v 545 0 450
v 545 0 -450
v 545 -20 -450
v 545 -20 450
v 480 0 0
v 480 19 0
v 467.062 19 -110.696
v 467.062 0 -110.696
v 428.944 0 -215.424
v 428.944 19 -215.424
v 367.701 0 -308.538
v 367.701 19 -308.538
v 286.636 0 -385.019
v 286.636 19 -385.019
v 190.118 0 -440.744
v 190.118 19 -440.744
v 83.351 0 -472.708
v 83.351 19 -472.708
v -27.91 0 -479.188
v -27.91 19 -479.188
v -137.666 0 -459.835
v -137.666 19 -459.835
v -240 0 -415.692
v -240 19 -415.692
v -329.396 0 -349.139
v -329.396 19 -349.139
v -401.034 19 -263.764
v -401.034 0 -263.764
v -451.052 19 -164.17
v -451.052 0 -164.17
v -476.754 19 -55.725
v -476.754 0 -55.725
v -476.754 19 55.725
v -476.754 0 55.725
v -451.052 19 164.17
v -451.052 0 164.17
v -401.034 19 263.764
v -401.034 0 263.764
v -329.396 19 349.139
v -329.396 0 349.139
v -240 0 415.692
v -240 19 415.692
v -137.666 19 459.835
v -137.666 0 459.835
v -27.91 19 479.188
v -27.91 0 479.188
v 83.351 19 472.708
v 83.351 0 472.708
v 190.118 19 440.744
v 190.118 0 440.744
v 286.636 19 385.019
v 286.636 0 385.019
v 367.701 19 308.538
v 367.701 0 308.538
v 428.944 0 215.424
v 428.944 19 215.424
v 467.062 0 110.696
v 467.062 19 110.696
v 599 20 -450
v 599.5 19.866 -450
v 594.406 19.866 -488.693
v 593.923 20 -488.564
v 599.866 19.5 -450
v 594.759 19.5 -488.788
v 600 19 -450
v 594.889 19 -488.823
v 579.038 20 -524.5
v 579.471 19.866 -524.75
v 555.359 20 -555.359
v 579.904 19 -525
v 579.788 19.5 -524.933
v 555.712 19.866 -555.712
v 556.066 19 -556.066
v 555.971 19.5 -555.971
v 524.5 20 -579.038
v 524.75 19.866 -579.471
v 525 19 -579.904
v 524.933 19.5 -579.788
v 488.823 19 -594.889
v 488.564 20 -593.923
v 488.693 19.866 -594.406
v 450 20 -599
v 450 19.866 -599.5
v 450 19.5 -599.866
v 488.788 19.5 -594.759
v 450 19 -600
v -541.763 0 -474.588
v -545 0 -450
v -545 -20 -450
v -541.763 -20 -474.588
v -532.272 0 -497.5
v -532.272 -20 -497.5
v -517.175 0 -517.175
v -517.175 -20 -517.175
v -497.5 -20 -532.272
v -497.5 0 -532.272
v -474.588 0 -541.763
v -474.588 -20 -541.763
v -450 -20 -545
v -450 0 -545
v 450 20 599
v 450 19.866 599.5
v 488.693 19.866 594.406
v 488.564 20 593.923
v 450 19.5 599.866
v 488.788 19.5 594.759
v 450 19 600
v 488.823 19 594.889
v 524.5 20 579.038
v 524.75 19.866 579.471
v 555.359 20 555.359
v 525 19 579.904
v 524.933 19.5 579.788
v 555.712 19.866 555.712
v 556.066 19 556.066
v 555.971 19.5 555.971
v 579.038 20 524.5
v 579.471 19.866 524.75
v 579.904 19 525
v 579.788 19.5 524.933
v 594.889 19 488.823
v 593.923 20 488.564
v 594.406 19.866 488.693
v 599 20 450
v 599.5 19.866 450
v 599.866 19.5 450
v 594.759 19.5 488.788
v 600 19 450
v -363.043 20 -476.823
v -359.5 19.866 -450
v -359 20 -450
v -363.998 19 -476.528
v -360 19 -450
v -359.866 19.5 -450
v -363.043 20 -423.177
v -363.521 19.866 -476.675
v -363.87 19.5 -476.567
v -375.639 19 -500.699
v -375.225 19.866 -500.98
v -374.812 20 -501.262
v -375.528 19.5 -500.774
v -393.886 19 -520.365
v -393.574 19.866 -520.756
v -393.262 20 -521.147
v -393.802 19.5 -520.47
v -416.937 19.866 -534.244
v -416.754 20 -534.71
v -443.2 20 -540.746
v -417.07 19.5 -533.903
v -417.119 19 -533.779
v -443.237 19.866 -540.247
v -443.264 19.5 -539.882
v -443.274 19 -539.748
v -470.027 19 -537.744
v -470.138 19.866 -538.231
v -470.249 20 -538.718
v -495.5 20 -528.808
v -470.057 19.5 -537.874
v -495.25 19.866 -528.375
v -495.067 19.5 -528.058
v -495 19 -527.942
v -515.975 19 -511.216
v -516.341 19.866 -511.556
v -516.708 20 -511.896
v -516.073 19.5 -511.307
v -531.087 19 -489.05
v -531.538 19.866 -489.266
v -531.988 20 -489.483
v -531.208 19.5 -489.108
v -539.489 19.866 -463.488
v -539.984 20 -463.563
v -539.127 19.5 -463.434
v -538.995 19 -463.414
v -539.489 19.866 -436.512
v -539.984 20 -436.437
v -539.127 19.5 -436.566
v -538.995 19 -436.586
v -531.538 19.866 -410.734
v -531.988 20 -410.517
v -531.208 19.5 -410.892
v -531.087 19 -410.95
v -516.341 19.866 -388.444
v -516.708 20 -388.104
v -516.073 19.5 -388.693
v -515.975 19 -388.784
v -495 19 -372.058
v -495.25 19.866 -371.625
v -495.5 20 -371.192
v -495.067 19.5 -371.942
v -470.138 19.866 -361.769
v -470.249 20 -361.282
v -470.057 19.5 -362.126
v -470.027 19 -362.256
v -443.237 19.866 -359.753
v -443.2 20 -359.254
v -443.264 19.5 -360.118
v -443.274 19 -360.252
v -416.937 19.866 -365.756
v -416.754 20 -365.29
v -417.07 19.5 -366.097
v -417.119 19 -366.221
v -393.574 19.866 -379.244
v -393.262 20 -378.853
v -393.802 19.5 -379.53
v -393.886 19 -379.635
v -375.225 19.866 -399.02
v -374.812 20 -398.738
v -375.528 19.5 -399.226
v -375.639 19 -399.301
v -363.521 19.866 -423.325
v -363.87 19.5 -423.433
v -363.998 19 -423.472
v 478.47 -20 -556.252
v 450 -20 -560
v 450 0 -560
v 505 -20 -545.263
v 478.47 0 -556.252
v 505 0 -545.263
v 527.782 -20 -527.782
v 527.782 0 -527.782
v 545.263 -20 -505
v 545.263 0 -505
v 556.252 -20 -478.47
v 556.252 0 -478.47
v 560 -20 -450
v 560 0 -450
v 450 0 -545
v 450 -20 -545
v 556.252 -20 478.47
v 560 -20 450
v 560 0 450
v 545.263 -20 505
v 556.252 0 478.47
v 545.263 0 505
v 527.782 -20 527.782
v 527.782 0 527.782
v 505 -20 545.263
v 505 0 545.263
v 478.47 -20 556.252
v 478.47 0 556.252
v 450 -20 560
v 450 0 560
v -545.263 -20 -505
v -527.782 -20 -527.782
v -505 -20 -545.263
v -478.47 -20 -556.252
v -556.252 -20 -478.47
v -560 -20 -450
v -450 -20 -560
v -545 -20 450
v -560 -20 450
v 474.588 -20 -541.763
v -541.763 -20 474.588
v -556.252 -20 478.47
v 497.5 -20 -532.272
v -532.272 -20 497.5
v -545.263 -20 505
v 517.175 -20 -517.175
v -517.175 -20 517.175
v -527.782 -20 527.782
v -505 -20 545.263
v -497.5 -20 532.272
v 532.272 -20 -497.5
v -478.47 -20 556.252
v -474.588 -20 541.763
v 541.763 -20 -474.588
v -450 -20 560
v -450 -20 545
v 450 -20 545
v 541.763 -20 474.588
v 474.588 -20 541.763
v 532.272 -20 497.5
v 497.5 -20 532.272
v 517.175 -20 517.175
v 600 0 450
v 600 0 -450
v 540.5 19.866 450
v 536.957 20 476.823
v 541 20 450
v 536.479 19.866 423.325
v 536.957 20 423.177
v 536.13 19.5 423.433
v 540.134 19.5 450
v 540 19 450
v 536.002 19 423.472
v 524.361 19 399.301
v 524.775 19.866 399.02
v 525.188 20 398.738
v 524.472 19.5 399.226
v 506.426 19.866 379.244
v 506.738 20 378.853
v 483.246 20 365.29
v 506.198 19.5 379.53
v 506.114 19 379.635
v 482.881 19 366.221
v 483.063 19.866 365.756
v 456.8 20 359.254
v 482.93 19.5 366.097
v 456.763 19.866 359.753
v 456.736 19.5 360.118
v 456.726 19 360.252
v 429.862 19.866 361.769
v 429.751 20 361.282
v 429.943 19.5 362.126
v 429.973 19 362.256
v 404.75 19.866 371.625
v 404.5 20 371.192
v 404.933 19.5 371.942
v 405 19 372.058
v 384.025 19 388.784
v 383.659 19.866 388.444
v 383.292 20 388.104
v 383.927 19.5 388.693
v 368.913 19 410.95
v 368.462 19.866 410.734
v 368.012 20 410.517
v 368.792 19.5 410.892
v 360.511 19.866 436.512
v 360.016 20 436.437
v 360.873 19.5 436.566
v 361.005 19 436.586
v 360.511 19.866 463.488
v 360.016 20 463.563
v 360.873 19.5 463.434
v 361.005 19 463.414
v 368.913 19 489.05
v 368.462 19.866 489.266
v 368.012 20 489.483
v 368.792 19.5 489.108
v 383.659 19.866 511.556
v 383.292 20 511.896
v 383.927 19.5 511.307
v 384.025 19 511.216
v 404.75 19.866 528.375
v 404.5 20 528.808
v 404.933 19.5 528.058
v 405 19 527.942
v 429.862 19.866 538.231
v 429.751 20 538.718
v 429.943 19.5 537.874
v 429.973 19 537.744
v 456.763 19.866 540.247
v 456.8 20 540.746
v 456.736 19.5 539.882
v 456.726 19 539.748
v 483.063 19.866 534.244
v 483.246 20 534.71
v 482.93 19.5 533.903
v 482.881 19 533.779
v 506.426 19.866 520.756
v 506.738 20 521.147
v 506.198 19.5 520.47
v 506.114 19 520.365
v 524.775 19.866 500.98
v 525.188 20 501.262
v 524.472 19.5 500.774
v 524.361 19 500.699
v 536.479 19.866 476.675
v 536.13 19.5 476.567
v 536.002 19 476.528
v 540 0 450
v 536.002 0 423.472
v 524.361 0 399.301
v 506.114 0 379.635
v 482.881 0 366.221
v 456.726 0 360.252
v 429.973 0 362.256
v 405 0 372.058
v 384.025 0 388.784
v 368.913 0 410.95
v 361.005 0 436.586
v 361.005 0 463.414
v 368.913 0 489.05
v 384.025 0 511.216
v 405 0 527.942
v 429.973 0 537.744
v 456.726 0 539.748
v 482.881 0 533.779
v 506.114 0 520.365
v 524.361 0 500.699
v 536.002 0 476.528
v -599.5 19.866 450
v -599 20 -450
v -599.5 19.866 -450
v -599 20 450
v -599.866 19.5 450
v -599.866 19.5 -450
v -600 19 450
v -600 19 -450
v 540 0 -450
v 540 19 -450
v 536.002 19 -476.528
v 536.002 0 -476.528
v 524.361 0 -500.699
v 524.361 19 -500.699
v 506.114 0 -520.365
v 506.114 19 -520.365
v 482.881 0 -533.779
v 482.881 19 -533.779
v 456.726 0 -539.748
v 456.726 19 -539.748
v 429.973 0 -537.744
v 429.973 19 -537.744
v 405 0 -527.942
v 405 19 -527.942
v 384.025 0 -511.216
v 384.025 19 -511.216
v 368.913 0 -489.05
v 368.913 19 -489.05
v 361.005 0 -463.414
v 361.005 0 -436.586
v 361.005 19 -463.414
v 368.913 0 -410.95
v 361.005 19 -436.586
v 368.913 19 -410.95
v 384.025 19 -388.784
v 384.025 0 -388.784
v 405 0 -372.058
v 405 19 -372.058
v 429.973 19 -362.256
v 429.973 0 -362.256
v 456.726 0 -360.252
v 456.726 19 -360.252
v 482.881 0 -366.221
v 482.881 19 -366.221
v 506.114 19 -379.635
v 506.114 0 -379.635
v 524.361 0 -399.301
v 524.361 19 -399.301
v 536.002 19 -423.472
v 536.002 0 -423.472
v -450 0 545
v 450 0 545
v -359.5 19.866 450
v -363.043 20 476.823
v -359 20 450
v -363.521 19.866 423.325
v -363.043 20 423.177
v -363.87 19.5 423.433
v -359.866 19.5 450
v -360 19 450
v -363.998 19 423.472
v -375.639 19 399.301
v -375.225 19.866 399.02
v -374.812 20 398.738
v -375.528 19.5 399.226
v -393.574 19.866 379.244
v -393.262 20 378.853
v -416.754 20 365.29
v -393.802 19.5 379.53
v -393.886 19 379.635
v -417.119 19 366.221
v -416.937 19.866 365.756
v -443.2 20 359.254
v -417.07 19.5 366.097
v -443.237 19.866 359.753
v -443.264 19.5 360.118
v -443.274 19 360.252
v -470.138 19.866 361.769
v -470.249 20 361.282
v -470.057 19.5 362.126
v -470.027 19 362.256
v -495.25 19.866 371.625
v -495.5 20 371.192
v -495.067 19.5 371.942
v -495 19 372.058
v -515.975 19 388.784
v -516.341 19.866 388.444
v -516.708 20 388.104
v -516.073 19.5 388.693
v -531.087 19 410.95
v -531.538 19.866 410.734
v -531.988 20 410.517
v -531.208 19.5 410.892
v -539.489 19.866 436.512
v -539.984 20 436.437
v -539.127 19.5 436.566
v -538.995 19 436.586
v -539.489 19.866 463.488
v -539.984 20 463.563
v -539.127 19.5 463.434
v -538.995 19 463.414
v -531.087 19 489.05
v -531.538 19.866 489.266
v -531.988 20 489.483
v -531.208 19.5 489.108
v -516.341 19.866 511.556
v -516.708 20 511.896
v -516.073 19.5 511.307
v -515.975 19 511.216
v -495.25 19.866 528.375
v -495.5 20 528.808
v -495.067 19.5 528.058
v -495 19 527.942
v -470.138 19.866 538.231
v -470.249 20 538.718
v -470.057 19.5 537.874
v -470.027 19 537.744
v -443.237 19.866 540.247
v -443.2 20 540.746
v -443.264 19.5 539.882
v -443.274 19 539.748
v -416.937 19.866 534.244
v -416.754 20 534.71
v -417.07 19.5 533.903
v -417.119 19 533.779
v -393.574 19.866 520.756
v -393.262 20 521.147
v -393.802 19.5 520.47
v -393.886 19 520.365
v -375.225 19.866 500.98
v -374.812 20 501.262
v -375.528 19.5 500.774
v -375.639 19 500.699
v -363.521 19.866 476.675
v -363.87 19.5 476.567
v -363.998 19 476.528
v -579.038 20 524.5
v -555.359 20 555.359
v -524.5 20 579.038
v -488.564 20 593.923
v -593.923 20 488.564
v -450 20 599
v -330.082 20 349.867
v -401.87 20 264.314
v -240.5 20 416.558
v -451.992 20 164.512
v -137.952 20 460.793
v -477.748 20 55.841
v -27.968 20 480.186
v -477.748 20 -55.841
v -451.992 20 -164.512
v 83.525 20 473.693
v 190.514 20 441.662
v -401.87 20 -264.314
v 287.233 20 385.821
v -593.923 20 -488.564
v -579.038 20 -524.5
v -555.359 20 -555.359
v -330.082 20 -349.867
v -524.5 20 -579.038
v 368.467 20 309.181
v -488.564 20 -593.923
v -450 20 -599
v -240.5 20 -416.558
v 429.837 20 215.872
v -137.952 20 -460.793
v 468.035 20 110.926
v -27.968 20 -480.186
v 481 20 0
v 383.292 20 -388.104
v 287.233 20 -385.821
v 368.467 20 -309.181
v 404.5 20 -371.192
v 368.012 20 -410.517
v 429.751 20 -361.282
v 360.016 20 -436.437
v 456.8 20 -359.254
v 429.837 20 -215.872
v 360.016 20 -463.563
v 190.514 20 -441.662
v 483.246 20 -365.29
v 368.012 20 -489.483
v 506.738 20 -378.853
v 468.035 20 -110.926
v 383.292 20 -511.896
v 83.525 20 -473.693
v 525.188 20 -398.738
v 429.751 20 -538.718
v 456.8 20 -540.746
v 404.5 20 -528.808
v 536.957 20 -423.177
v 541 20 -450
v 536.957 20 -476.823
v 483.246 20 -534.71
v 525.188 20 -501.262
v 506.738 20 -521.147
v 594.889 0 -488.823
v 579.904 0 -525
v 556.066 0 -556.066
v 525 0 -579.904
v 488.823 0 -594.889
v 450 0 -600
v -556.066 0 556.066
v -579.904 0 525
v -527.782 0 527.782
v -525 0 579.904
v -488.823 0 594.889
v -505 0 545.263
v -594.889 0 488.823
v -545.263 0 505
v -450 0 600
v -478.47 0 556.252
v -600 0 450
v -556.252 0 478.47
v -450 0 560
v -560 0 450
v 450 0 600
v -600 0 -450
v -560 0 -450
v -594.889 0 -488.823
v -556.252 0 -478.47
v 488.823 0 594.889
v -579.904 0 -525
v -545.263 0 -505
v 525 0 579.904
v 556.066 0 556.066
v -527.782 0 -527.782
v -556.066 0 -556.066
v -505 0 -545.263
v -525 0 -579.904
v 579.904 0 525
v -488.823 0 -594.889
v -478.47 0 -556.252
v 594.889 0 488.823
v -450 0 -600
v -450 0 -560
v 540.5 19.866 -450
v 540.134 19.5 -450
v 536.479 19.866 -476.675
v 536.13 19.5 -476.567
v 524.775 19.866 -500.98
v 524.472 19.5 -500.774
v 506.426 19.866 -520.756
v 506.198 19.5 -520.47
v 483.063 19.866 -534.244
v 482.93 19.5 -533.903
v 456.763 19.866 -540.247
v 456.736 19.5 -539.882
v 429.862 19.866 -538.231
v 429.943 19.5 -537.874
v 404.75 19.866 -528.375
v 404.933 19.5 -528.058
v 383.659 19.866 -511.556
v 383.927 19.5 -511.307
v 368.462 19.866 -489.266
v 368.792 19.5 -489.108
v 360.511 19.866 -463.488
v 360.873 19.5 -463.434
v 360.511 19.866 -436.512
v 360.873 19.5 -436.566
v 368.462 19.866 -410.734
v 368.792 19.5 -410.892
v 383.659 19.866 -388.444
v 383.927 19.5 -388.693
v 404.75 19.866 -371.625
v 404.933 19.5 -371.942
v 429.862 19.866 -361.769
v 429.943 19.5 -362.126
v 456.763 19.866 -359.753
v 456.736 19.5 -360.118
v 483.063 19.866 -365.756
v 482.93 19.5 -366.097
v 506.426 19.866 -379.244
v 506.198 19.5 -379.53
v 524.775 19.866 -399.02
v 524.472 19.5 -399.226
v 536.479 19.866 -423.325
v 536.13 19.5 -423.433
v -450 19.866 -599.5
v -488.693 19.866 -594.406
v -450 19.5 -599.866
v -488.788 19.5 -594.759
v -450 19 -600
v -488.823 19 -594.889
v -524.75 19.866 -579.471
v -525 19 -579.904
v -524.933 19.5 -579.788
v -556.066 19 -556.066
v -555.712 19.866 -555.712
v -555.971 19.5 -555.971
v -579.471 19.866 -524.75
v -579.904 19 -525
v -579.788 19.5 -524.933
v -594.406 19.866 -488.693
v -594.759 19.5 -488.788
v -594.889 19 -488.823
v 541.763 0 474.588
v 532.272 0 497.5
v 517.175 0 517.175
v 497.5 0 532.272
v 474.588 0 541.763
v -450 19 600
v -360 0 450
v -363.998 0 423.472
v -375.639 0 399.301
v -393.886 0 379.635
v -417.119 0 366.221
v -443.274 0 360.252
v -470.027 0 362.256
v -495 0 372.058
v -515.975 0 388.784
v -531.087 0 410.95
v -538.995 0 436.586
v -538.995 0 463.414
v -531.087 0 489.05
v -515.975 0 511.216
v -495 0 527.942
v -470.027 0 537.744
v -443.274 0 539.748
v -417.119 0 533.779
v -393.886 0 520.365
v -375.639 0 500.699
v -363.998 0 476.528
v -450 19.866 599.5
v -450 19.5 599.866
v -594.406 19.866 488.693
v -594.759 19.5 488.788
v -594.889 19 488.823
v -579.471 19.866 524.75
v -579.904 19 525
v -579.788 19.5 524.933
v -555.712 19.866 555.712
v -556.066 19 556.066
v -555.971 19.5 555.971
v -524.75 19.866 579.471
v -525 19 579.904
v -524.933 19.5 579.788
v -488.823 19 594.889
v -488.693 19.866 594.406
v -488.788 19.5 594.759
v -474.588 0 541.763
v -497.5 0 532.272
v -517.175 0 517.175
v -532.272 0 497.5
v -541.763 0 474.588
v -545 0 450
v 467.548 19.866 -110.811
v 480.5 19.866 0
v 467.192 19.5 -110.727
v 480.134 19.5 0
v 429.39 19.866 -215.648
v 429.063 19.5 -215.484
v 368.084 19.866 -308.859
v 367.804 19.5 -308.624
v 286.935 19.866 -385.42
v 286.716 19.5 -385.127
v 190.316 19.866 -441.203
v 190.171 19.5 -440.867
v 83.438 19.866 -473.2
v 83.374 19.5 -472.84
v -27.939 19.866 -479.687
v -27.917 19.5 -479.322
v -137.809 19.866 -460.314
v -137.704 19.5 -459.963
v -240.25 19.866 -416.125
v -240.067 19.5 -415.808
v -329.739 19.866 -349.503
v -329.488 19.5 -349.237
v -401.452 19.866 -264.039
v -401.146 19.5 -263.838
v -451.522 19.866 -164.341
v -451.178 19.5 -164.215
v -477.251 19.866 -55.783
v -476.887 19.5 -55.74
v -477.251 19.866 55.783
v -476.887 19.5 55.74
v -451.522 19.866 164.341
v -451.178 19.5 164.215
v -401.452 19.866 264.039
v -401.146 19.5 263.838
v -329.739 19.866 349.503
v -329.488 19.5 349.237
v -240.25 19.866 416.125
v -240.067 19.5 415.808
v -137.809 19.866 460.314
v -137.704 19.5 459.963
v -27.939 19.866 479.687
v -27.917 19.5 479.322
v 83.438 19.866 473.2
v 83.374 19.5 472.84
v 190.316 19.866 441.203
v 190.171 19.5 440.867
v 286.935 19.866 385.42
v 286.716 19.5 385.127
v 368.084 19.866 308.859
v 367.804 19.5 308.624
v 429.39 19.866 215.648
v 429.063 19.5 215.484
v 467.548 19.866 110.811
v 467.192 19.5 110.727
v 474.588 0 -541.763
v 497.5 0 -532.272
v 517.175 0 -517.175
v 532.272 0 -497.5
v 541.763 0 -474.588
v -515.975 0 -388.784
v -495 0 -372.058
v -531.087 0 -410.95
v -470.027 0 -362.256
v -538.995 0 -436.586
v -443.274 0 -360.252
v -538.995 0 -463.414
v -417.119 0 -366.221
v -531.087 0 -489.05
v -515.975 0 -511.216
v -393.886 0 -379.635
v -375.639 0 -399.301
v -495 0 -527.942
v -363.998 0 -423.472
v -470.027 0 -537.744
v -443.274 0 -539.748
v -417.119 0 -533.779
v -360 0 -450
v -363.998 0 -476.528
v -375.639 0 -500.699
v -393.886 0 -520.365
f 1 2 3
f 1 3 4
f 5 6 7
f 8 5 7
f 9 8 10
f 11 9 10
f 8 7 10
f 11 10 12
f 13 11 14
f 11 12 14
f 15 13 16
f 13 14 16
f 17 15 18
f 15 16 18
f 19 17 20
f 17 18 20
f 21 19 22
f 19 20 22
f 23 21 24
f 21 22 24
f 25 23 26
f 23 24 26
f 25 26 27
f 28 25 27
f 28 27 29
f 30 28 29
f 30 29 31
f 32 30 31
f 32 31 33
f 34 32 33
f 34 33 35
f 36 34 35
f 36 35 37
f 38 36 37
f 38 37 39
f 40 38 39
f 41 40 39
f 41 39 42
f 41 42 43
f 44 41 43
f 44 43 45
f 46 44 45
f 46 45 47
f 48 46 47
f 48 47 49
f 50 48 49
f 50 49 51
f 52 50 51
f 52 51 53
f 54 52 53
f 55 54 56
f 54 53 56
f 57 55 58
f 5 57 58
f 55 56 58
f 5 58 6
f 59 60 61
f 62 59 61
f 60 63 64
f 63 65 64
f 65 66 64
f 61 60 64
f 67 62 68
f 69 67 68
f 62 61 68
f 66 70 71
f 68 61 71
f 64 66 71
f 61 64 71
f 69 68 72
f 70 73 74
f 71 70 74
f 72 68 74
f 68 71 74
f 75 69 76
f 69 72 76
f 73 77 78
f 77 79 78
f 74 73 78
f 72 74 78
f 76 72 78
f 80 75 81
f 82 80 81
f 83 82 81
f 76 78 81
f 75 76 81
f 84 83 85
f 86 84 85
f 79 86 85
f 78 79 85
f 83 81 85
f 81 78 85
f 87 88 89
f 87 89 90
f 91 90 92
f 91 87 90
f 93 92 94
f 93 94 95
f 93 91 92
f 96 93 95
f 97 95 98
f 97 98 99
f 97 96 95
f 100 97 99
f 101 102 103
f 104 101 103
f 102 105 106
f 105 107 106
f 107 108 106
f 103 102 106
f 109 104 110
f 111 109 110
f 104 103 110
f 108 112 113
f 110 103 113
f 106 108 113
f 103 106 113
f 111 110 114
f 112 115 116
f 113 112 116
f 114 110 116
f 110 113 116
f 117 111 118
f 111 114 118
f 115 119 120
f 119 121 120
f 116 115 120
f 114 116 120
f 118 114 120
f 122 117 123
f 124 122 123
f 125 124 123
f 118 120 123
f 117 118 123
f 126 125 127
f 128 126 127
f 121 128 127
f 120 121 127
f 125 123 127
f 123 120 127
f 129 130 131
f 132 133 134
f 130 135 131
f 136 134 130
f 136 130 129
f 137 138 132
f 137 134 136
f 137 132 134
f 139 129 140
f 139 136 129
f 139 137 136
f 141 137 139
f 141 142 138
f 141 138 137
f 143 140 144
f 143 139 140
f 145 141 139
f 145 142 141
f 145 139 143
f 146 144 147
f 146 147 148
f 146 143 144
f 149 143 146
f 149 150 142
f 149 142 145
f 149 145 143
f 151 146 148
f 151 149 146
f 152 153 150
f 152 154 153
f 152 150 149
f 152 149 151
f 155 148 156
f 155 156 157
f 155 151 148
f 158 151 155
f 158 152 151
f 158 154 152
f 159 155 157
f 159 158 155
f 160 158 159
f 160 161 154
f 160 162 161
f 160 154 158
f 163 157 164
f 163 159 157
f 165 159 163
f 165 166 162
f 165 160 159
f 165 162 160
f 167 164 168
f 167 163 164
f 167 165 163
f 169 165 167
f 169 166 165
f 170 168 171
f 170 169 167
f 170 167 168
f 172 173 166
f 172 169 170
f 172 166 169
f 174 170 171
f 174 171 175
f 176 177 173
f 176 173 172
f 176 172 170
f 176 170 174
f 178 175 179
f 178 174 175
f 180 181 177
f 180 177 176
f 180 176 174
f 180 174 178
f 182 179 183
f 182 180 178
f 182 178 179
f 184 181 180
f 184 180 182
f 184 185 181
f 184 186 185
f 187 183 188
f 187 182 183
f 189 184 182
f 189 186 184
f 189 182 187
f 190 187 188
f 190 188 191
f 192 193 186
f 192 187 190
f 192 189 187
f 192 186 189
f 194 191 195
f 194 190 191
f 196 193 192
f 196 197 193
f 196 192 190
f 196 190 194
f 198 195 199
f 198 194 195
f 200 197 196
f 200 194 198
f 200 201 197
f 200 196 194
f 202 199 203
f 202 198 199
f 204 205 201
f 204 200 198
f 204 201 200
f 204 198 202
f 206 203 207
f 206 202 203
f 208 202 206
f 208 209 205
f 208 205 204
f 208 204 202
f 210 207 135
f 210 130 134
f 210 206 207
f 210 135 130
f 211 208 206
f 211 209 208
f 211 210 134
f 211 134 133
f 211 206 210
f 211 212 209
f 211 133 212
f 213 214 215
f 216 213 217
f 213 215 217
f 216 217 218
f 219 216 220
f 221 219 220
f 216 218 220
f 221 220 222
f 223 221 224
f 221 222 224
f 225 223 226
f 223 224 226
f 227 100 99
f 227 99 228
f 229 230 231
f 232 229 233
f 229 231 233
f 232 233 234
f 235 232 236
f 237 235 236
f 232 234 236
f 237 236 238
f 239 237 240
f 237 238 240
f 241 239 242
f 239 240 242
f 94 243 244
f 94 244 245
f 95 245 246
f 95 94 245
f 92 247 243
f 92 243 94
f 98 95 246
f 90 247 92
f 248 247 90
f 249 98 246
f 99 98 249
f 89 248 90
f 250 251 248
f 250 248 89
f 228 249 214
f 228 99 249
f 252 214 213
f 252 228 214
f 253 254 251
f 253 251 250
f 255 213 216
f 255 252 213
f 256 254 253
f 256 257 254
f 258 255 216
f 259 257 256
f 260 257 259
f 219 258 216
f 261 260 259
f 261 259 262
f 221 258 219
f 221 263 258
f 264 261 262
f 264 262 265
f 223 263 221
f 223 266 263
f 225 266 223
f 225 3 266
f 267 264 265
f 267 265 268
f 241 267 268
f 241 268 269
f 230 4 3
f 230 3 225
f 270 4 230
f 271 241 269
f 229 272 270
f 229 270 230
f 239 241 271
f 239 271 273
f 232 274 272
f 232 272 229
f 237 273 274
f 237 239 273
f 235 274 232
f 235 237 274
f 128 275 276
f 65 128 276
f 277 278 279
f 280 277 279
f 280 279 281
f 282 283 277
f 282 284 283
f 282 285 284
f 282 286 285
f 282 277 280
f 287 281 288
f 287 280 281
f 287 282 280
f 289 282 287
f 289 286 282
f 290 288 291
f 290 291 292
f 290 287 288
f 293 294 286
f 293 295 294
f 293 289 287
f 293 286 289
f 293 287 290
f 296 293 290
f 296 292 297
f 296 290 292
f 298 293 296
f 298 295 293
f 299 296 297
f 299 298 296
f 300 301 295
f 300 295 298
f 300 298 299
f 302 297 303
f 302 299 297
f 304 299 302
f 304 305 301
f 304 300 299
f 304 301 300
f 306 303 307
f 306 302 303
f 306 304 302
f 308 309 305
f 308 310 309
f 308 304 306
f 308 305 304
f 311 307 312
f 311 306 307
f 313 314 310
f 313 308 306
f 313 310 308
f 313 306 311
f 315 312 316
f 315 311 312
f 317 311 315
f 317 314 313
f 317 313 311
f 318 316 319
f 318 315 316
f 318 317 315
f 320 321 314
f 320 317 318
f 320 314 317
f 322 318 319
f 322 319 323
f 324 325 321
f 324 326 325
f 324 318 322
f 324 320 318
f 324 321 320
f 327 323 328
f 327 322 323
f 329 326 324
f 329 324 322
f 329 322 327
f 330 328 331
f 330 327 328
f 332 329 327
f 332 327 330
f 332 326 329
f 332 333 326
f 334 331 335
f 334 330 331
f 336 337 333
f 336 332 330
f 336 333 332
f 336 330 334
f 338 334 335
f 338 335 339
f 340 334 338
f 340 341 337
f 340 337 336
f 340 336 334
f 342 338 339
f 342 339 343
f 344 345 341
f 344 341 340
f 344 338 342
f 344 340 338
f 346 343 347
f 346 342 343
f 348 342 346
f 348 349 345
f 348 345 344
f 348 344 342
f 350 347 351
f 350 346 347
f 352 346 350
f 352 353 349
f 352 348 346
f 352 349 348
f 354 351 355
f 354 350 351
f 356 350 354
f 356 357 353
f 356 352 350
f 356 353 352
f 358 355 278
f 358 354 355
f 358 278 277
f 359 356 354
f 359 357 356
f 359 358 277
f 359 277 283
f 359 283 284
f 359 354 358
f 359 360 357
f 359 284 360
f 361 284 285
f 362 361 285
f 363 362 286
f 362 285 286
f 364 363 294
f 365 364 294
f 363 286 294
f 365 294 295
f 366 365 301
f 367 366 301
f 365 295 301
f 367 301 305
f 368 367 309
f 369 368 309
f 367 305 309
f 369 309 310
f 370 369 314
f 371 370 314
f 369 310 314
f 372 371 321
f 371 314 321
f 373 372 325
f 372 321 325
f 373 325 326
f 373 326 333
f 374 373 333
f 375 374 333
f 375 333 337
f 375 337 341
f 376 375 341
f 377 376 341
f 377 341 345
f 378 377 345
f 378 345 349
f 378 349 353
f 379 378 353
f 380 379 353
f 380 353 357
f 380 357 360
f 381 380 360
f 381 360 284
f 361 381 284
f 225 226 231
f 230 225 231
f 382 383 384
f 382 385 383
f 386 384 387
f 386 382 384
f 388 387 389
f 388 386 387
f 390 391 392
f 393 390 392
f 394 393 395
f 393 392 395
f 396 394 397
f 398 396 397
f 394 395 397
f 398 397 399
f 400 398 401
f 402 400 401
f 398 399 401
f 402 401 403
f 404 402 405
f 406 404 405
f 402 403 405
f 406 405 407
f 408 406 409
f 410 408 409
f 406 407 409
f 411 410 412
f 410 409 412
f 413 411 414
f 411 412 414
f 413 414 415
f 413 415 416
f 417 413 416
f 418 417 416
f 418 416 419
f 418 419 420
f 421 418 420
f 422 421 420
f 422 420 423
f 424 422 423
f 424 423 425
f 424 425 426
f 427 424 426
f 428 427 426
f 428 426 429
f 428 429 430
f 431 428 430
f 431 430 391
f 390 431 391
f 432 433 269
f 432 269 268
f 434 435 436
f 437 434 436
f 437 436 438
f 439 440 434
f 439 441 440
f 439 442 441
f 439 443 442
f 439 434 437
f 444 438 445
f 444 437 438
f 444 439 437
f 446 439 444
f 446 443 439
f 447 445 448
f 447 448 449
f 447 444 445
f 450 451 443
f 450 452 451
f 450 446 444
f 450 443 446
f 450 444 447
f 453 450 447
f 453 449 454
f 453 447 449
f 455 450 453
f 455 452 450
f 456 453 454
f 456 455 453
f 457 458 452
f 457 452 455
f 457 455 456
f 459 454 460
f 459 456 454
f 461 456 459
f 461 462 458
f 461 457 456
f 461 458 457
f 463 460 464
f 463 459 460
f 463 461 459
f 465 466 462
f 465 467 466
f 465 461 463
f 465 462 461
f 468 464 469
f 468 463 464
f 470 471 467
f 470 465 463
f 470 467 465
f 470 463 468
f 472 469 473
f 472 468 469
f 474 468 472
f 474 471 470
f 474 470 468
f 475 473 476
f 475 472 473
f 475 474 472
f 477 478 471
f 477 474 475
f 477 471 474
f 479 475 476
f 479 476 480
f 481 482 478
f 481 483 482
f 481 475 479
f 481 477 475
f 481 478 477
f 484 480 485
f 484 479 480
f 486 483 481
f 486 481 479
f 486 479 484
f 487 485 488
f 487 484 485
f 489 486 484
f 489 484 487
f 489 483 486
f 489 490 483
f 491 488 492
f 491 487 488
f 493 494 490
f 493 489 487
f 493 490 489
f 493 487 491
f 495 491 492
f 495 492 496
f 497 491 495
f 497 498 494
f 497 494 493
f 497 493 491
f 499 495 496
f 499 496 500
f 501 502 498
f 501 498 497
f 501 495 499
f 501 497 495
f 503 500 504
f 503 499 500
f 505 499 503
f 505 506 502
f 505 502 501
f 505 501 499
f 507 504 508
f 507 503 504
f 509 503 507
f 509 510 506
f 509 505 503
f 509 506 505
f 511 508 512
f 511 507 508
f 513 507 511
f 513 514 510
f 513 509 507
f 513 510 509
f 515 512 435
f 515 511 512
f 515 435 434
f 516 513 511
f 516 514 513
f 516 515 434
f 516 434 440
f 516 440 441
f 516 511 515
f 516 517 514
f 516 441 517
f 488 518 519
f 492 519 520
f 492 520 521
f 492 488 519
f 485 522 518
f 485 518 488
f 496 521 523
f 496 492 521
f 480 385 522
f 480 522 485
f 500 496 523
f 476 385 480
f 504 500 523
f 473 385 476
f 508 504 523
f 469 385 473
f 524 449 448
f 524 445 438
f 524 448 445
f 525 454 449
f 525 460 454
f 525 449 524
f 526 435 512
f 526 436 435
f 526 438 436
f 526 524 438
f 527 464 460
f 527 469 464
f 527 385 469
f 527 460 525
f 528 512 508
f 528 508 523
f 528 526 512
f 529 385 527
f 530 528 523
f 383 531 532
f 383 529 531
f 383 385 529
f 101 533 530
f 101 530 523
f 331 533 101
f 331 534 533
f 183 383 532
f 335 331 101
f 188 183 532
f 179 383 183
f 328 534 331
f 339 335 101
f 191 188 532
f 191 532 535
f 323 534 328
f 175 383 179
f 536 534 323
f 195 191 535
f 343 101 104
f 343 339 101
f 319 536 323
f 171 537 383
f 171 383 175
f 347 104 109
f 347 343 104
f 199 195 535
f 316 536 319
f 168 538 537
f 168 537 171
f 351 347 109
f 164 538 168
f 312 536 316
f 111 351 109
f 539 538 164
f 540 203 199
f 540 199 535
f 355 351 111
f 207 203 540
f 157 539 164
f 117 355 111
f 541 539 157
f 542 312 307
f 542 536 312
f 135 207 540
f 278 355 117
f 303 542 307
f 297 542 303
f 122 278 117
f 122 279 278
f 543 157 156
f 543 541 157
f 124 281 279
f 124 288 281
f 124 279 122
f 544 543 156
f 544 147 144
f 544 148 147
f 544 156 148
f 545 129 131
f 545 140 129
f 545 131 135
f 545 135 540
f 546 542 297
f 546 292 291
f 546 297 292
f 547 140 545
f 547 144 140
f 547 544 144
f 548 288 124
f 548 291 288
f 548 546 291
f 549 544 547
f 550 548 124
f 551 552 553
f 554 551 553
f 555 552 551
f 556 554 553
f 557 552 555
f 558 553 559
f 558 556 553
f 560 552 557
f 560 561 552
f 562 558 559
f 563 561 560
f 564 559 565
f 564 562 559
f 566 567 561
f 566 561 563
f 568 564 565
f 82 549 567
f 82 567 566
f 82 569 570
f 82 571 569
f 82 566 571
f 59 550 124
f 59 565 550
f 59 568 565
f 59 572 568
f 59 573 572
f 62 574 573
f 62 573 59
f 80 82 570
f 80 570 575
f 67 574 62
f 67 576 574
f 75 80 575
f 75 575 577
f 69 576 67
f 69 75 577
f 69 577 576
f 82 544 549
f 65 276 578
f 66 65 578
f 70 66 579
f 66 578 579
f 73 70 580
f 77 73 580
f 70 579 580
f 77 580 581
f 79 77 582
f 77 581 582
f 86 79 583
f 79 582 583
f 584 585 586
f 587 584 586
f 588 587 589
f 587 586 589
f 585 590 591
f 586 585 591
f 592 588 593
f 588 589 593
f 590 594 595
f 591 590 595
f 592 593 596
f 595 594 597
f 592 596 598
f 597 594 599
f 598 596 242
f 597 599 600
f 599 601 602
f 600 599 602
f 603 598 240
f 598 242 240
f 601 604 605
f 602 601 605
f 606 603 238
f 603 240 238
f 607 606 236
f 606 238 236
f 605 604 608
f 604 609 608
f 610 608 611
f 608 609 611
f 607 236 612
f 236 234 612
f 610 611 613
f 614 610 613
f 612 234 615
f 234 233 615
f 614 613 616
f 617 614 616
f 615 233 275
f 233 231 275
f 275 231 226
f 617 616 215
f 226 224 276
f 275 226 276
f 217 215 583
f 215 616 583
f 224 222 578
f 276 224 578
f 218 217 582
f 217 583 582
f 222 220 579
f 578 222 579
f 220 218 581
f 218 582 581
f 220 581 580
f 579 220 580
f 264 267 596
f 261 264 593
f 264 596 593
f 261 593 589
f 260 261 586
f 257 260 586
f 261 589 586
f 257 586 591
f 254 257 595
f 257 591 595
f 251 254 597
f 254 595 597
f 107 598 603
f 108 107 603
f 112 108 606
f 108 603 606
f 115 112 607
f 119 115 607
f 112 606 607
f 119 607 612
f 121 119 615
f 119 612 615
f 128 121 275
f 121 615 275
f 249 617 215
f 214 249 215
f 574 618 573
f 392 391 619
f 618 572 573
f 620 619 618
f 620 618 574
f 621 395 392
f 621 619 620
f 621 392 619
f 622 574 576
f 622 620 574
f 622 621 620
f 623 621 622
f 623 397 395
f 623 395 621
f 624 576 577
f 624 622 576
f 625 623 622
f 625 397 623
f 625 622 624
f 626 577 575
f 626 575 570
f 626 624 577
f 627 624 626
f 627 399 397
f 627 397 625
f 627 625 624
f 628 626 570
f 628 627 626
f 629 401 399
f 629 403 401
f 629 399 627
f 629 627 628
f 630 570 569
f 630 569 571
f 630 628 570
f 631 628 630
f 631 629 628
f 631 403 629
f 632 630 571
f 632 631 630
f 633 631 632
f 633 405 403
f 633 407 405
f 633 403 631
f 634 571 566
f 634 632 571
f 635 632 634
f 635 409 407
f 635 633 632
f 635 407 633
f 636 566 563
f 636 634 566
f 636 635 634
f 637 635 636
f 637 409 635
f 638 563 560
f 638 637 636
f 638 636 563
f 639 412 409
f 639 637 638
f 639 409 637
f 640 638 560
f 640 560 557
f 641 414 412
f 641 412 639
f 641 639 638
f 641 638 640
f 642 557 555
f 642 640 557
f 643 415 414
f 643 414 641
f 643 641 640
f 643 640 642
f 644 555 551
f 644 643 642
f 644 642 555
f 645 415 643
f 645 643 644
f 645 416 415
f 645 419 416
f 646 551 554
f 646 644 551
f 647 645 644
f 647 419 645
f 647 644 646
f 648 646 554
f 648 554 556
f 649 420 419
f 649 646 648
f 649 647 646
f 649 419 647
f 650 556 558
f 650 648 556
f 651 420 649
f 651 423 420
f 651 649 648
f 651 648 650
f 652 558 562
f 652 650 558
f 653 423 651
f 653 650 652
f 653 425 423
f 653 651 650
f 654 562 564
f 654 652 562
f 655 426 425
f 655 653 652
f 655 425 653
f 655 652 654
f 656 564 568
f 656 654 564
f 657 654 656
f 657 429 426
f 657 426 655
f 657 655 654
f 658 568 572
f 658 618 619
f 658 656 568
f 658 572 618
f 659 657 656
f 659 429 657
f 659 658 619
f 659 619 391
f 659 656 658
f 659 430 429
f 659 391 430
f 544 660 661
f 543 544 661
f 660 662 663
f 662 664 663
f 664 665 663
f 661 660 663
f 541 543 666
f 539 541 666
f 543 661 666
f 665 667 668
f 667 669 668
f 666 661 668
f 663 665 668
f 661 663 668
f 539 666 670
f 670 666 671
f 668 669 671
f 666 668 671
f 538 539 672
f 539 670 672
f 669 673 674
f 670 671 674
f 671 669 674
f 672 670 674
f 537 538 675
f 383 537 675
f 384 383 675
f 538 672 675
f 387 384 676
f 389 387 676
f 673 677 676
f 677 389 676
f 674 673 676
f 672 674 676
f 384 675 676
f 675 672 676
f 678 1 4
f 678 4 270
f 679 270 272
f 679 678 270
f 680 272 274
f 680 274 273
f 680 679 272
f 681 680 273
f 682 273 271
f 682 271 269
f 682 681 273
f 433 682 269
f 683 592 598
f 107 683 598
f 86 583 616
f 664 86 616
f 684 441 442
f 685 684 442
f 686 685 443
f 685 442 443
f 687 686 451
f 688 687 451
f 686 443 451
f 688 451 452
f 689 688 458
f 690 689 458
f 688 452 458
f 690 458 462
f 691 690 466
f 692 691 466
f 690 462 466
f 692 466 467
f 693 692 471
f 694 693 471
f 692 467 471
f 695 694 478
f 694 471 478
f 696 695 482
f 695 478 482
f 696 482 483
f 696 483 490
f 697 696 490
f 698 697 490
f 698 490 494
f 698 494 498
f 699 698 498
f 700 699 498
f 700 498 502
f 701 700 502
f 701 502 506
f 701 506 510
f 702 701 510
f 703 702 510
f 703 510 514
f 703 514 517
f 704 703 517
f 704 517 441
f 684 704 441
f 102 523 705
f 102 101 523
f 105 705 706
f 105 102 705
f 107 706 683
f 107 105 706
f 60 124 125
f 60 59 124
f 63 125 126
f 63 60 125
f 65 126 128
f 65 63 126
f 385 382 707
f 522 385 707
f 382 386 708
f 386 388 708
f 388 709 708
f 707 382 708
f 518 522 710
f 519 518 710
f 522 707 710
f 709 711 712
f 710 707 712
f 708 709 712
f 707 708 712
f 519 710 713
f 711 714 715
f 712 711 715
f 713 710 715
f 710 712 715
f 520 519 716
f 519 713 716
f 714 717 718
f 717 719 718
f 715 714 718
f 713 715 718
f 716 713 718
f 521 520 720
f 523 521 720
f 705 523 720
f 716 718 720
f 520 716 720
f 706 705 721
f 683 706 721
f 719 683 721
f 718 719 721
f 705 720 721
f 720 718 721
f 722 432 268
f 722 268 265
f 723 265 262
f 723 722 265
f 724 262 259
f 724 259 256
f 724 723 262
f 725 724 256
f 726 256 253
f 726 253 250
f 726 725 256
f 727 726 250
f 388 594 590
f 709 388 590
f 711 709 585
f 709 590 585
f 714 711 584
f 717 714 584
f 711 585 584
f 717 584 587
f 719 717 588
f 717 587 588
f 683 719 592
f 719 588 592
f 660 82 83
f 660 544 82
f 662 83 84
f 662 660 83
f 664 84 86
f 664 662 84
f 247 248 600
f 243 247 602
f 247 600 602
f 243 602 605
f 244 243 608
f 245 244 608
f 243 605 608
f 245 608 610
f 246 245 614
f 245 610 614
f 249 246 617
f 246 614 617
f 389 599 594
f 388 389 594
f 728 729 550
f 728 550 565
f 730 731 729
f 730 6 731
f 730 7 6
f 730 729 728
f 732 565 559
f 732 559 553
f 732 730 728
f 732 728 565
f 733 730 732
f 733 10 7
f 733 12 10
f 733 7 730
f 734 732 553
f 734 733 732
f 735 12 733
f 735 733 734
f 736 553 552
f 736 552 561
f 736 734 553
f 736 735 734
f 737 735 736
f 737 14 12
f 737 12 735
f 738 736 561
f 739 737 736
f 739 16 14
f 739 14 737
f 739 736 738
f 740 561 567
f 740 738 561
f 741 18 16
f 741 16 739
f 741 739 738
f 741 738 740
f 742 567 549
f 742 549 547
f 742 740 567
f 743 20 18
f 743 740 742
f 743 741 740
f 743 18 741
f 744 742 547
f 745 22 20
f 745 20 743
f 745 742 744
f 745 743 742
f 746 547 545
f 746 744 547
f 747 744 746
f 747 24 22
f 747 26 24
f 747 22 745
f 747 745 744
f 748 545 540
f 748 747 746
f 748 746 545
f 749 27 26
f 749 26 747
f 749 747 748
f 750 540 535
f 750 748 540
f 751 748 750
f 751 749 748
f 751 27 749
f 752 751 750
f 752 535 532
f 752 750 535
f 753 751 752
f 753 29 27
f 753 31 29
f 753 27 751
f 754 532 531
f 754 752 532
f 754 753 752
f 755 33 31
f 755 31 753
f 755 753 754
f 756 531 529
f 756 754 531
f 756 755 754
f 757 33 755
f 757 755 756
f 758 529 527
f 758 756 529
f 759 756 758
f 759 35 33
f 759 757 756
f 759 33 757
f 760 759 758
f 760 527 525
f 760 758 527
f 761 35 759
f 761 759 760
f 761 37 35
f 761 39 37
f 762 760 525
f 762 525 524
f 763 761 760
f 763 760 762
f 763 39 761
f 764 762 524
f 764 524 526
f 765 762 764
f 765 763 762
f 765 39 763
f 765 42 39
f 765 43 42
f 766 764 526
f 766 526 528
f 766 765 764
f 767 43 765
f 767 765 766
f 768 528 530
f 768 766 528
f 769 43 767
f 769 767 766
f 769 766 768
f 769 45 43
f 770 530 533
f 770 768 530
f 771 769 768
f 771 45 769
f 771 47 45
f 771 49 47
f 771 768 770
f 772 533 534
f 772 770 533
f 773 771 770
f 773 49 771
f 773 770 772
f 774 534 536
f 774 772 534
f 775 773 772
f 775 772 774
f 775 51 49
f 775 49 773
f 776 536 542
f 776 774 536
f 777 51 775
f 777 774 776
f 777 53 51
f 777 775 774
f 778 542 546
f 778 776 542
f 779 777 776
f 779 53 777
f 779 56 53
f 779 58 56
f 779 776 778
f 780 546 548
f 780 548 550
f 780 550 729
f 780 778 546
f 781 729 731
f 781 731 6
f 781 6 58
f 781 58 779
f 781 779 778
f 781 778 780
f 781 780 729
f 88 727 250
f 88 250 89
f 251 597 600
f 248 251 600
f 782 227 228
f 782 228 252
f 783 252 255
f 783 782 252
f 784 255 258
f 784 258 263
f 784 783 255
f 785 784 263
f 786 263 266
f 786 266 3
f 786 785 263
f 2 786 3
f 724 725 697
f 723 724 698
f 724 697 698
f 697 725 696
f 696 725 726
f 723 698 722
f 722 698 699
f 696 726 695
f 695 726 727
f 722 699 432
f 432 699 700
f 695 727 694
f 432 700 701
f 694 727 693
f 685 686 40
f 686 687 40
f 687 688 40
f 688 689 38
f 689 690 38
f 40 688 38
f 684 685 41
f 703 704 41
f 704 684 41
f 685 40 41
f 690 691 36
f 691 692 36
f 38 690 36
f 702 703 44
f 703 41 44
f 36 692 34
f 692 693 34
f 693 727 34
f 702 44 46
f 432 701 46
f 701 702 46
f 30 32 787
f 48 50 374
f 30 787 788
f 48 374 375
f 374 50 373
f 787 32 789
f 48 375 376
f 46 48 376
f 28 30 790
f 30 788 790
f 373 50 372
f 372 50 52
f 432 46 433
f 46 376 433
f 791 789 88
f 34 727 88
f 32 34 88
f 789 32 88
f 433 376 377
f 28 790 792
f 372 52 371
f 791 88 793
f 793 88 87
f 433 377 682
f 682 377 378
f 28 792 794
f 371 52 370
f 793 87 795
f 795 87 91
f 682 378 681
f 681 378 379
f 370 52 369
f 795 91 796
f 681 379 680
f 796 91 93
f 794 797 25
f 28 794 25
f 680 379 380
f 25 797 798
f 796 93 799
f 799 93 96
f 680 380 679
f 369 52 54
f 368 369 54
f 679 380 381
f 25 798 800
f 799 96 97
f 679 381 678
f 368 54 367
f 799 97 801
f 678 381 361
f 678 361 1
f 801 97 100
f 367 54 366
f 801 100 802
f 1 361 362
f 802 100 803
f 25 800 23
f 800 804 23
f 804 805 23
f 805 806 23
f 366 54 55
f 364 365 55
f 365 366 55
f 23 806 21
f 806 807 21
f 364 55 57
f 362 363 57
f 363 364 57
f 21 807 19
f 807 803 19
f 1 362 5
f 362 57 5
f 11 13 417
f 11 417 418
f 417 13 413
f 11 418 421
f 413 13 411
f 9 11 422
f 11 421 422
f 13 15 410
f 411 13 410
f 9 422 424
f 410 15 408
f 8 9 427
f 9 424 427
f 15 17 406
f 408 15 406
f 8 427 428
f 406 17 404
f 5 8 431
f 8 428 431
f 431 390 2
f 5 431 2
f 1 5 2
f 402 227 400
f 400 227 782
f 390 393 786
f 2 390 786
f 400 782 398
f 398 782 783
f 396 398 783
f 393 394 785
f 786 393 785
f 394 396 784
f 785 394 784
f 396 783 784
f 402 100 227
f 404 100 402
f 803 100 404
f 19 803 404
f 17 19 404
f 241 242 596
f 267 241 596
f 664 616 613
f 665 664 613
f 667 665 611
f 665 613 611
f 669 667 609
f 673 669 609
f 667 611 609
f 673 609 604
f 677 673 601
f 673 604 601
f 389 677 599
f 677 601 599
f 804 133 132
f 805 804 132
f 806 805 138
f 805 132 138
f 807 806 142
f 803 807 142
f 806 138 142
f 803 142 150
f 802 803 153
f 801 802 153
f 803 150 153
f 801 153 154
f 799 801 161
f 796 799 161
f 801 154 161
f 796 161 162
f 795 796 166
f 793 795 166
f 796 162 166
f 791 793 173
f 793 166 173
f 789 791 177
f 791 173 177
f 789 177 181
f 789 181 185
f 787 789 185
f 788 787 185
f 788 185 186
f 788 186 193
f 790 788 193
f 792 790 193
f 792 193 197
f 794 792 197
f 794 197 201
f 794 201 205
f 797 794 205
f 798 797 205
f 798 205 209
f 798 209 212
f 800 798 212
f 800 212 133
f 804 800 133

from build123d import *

# Parameters (mm, degrees)
BOSS_EXTRUDE1_DEPTH = 20
SKETCH3_R           = 90
CUT_EXTRUDE1_DEPTH  = 21
SKETCH4_R           = 480
CUT_EXTRUDE2_DEPTH  = 21
BOSS_EXTRUDE2_DEPTH = 20
FILLET1_R           = 1
FILLET2_R           = 1
FILLET3_R           = 1


with BuildPart() as part:
    # Sketch1 → Boss-Extrude1 (new body)
    with BuildSketch(Plane(origin=(0, 0, 0), x_dir=(1, 0, 0), z_dir=(0, 1, 0))):
        with BuildLine():
            Line((-450, -600), (450, -600))
            ThreePointArc((450, -600), (556.066017178, -556.066017178), (600, -450))
            Line((600, -450), (600, 450))
            ThreePointArc((600, 450), (556.066017178, 556.066017178), (450, 600))
            Line((450, 600), (-450, 600))
            ThreePointArc((-450, 600), (-556.066017178, 556.066017178), (-600, 450))
            Line((-600, 450), (-600, -450))
            ThreePointArc((-600, -450), (-556.066017178, -556.066017178), (-450, -600))
        make_face()
    extrude(amount=BOSS_EXTRUDE1_DEPTH)

    # Sketch3 → Cut-Extrude1 (cut, through all)
    with BuildSketch(Plane(origin=(0, 20, 0), x_dir=(1, 0, 0), z_dir=(0, 1, 0))):
        with Locations((-450, 450)):
            Circle(SKETCH3_R)
        with Locations((450, 450)):
            Circle(SKETCH3_R)
        with Locations((-450, -450)):
            Circle(SKETCH3_R)
        with Locations((450, -450)):
            Circle(SKETCH3_R)
    extrude(amount=-CUT_EXTRUDE1_DEPTH, mode=Mode.SUBTRACT)

    # Sketch4 → Cut-Extrude2 (cut, through all)
    with BuildSketch(Plane(origin=(0, 20, 0), x_dir=(1, 0, 0), z_dir=(0, 1, 0))):
        Circle(SKETCH4_R)
    extrude(amount=-CUT_EXTRUDE2_DEPTH, mode=Mode.SUBTRACT)

    # Sketch2 → Boss-Extrude2 (add)
    with BuildSketch(Plane.XZ):
        with BuildLine():
            Line((560, -450), (560, 450))
            ThreePointArc((560, 450), (527.781745931, 527.781745931), (450, 560))
            Line((450, 560), (-450, 560))
            ThreePointArc((-450, 560), (-527.781745931, 527.781745931), (-560, 450))
            Line((-560, 450), (-560, -450))
            ThreePointArc((-560, -450), (-527.781745931, -527.781745931), (-450, -560))
            Line((-450, -560), (450, -560))
            ThreePointArc((450, -560), (527.781745931, -527.781745931), (560, -450))
        make_face()
        with BuildLine():
            Line((545, -450), (545, 450))
            ThreePointArc((545, 450), (517.175144213, 517.175144213), (450, 545))
            Line((450, 545), (-450, 545))
            ThreePointArc((-450, 545), (-517.175144213, 517.175144213), (-545, 450))
            Line((-545, 450), (-545, -450))
            ThreePointArc((-545, -450), (-517.175144213, -517.175144213), (-450, -545))
            Line((-450, -545), (450, -545))
            ThreePointArc((450, -545), (517.175144213, -517.175144213), (545, -450))
        make_face(mode=Mode.SUBTRACT)
    extrude(amount=BOSS_EXTRUDE2_DEPTH)

    # Fillet1
    fillet1_edges = [part.edges().sort_by_distance(p)[0] for p in [
        (-556.066017178, 20, -556.066017178),
        (-600, 20, 0),
        (-556.066017178, 20, 556.066017178),
        (0, 20, 600),
        (556.066017178, 20, 556.066017178),
        (600, 20, 0),
        (556.066017178, 20, -556.066017178),
        (0, 20, -600),
    ]]
    fillet(fillet1_edges, radius=FILLET1_R)

    # Fillet2
    fillet2_edges = [part.edges().sort_by_distance(p)[0] for p in [
        (-480, 20, 0),
    ]]
    fillet(fillet2_edges, radius=FILLET2_R)

    # Fillet3
    fillet3_edges = [part.edges().sort_by_distance(p)[0] for p in [
        (-540, 20, -450),
        (360, 20, -450),
        (-540, 20, 450),
        (360, 20, 450),
    ]]
    fillet(fillet3_edges, radius=FILLET3_R)


solid = part.part
